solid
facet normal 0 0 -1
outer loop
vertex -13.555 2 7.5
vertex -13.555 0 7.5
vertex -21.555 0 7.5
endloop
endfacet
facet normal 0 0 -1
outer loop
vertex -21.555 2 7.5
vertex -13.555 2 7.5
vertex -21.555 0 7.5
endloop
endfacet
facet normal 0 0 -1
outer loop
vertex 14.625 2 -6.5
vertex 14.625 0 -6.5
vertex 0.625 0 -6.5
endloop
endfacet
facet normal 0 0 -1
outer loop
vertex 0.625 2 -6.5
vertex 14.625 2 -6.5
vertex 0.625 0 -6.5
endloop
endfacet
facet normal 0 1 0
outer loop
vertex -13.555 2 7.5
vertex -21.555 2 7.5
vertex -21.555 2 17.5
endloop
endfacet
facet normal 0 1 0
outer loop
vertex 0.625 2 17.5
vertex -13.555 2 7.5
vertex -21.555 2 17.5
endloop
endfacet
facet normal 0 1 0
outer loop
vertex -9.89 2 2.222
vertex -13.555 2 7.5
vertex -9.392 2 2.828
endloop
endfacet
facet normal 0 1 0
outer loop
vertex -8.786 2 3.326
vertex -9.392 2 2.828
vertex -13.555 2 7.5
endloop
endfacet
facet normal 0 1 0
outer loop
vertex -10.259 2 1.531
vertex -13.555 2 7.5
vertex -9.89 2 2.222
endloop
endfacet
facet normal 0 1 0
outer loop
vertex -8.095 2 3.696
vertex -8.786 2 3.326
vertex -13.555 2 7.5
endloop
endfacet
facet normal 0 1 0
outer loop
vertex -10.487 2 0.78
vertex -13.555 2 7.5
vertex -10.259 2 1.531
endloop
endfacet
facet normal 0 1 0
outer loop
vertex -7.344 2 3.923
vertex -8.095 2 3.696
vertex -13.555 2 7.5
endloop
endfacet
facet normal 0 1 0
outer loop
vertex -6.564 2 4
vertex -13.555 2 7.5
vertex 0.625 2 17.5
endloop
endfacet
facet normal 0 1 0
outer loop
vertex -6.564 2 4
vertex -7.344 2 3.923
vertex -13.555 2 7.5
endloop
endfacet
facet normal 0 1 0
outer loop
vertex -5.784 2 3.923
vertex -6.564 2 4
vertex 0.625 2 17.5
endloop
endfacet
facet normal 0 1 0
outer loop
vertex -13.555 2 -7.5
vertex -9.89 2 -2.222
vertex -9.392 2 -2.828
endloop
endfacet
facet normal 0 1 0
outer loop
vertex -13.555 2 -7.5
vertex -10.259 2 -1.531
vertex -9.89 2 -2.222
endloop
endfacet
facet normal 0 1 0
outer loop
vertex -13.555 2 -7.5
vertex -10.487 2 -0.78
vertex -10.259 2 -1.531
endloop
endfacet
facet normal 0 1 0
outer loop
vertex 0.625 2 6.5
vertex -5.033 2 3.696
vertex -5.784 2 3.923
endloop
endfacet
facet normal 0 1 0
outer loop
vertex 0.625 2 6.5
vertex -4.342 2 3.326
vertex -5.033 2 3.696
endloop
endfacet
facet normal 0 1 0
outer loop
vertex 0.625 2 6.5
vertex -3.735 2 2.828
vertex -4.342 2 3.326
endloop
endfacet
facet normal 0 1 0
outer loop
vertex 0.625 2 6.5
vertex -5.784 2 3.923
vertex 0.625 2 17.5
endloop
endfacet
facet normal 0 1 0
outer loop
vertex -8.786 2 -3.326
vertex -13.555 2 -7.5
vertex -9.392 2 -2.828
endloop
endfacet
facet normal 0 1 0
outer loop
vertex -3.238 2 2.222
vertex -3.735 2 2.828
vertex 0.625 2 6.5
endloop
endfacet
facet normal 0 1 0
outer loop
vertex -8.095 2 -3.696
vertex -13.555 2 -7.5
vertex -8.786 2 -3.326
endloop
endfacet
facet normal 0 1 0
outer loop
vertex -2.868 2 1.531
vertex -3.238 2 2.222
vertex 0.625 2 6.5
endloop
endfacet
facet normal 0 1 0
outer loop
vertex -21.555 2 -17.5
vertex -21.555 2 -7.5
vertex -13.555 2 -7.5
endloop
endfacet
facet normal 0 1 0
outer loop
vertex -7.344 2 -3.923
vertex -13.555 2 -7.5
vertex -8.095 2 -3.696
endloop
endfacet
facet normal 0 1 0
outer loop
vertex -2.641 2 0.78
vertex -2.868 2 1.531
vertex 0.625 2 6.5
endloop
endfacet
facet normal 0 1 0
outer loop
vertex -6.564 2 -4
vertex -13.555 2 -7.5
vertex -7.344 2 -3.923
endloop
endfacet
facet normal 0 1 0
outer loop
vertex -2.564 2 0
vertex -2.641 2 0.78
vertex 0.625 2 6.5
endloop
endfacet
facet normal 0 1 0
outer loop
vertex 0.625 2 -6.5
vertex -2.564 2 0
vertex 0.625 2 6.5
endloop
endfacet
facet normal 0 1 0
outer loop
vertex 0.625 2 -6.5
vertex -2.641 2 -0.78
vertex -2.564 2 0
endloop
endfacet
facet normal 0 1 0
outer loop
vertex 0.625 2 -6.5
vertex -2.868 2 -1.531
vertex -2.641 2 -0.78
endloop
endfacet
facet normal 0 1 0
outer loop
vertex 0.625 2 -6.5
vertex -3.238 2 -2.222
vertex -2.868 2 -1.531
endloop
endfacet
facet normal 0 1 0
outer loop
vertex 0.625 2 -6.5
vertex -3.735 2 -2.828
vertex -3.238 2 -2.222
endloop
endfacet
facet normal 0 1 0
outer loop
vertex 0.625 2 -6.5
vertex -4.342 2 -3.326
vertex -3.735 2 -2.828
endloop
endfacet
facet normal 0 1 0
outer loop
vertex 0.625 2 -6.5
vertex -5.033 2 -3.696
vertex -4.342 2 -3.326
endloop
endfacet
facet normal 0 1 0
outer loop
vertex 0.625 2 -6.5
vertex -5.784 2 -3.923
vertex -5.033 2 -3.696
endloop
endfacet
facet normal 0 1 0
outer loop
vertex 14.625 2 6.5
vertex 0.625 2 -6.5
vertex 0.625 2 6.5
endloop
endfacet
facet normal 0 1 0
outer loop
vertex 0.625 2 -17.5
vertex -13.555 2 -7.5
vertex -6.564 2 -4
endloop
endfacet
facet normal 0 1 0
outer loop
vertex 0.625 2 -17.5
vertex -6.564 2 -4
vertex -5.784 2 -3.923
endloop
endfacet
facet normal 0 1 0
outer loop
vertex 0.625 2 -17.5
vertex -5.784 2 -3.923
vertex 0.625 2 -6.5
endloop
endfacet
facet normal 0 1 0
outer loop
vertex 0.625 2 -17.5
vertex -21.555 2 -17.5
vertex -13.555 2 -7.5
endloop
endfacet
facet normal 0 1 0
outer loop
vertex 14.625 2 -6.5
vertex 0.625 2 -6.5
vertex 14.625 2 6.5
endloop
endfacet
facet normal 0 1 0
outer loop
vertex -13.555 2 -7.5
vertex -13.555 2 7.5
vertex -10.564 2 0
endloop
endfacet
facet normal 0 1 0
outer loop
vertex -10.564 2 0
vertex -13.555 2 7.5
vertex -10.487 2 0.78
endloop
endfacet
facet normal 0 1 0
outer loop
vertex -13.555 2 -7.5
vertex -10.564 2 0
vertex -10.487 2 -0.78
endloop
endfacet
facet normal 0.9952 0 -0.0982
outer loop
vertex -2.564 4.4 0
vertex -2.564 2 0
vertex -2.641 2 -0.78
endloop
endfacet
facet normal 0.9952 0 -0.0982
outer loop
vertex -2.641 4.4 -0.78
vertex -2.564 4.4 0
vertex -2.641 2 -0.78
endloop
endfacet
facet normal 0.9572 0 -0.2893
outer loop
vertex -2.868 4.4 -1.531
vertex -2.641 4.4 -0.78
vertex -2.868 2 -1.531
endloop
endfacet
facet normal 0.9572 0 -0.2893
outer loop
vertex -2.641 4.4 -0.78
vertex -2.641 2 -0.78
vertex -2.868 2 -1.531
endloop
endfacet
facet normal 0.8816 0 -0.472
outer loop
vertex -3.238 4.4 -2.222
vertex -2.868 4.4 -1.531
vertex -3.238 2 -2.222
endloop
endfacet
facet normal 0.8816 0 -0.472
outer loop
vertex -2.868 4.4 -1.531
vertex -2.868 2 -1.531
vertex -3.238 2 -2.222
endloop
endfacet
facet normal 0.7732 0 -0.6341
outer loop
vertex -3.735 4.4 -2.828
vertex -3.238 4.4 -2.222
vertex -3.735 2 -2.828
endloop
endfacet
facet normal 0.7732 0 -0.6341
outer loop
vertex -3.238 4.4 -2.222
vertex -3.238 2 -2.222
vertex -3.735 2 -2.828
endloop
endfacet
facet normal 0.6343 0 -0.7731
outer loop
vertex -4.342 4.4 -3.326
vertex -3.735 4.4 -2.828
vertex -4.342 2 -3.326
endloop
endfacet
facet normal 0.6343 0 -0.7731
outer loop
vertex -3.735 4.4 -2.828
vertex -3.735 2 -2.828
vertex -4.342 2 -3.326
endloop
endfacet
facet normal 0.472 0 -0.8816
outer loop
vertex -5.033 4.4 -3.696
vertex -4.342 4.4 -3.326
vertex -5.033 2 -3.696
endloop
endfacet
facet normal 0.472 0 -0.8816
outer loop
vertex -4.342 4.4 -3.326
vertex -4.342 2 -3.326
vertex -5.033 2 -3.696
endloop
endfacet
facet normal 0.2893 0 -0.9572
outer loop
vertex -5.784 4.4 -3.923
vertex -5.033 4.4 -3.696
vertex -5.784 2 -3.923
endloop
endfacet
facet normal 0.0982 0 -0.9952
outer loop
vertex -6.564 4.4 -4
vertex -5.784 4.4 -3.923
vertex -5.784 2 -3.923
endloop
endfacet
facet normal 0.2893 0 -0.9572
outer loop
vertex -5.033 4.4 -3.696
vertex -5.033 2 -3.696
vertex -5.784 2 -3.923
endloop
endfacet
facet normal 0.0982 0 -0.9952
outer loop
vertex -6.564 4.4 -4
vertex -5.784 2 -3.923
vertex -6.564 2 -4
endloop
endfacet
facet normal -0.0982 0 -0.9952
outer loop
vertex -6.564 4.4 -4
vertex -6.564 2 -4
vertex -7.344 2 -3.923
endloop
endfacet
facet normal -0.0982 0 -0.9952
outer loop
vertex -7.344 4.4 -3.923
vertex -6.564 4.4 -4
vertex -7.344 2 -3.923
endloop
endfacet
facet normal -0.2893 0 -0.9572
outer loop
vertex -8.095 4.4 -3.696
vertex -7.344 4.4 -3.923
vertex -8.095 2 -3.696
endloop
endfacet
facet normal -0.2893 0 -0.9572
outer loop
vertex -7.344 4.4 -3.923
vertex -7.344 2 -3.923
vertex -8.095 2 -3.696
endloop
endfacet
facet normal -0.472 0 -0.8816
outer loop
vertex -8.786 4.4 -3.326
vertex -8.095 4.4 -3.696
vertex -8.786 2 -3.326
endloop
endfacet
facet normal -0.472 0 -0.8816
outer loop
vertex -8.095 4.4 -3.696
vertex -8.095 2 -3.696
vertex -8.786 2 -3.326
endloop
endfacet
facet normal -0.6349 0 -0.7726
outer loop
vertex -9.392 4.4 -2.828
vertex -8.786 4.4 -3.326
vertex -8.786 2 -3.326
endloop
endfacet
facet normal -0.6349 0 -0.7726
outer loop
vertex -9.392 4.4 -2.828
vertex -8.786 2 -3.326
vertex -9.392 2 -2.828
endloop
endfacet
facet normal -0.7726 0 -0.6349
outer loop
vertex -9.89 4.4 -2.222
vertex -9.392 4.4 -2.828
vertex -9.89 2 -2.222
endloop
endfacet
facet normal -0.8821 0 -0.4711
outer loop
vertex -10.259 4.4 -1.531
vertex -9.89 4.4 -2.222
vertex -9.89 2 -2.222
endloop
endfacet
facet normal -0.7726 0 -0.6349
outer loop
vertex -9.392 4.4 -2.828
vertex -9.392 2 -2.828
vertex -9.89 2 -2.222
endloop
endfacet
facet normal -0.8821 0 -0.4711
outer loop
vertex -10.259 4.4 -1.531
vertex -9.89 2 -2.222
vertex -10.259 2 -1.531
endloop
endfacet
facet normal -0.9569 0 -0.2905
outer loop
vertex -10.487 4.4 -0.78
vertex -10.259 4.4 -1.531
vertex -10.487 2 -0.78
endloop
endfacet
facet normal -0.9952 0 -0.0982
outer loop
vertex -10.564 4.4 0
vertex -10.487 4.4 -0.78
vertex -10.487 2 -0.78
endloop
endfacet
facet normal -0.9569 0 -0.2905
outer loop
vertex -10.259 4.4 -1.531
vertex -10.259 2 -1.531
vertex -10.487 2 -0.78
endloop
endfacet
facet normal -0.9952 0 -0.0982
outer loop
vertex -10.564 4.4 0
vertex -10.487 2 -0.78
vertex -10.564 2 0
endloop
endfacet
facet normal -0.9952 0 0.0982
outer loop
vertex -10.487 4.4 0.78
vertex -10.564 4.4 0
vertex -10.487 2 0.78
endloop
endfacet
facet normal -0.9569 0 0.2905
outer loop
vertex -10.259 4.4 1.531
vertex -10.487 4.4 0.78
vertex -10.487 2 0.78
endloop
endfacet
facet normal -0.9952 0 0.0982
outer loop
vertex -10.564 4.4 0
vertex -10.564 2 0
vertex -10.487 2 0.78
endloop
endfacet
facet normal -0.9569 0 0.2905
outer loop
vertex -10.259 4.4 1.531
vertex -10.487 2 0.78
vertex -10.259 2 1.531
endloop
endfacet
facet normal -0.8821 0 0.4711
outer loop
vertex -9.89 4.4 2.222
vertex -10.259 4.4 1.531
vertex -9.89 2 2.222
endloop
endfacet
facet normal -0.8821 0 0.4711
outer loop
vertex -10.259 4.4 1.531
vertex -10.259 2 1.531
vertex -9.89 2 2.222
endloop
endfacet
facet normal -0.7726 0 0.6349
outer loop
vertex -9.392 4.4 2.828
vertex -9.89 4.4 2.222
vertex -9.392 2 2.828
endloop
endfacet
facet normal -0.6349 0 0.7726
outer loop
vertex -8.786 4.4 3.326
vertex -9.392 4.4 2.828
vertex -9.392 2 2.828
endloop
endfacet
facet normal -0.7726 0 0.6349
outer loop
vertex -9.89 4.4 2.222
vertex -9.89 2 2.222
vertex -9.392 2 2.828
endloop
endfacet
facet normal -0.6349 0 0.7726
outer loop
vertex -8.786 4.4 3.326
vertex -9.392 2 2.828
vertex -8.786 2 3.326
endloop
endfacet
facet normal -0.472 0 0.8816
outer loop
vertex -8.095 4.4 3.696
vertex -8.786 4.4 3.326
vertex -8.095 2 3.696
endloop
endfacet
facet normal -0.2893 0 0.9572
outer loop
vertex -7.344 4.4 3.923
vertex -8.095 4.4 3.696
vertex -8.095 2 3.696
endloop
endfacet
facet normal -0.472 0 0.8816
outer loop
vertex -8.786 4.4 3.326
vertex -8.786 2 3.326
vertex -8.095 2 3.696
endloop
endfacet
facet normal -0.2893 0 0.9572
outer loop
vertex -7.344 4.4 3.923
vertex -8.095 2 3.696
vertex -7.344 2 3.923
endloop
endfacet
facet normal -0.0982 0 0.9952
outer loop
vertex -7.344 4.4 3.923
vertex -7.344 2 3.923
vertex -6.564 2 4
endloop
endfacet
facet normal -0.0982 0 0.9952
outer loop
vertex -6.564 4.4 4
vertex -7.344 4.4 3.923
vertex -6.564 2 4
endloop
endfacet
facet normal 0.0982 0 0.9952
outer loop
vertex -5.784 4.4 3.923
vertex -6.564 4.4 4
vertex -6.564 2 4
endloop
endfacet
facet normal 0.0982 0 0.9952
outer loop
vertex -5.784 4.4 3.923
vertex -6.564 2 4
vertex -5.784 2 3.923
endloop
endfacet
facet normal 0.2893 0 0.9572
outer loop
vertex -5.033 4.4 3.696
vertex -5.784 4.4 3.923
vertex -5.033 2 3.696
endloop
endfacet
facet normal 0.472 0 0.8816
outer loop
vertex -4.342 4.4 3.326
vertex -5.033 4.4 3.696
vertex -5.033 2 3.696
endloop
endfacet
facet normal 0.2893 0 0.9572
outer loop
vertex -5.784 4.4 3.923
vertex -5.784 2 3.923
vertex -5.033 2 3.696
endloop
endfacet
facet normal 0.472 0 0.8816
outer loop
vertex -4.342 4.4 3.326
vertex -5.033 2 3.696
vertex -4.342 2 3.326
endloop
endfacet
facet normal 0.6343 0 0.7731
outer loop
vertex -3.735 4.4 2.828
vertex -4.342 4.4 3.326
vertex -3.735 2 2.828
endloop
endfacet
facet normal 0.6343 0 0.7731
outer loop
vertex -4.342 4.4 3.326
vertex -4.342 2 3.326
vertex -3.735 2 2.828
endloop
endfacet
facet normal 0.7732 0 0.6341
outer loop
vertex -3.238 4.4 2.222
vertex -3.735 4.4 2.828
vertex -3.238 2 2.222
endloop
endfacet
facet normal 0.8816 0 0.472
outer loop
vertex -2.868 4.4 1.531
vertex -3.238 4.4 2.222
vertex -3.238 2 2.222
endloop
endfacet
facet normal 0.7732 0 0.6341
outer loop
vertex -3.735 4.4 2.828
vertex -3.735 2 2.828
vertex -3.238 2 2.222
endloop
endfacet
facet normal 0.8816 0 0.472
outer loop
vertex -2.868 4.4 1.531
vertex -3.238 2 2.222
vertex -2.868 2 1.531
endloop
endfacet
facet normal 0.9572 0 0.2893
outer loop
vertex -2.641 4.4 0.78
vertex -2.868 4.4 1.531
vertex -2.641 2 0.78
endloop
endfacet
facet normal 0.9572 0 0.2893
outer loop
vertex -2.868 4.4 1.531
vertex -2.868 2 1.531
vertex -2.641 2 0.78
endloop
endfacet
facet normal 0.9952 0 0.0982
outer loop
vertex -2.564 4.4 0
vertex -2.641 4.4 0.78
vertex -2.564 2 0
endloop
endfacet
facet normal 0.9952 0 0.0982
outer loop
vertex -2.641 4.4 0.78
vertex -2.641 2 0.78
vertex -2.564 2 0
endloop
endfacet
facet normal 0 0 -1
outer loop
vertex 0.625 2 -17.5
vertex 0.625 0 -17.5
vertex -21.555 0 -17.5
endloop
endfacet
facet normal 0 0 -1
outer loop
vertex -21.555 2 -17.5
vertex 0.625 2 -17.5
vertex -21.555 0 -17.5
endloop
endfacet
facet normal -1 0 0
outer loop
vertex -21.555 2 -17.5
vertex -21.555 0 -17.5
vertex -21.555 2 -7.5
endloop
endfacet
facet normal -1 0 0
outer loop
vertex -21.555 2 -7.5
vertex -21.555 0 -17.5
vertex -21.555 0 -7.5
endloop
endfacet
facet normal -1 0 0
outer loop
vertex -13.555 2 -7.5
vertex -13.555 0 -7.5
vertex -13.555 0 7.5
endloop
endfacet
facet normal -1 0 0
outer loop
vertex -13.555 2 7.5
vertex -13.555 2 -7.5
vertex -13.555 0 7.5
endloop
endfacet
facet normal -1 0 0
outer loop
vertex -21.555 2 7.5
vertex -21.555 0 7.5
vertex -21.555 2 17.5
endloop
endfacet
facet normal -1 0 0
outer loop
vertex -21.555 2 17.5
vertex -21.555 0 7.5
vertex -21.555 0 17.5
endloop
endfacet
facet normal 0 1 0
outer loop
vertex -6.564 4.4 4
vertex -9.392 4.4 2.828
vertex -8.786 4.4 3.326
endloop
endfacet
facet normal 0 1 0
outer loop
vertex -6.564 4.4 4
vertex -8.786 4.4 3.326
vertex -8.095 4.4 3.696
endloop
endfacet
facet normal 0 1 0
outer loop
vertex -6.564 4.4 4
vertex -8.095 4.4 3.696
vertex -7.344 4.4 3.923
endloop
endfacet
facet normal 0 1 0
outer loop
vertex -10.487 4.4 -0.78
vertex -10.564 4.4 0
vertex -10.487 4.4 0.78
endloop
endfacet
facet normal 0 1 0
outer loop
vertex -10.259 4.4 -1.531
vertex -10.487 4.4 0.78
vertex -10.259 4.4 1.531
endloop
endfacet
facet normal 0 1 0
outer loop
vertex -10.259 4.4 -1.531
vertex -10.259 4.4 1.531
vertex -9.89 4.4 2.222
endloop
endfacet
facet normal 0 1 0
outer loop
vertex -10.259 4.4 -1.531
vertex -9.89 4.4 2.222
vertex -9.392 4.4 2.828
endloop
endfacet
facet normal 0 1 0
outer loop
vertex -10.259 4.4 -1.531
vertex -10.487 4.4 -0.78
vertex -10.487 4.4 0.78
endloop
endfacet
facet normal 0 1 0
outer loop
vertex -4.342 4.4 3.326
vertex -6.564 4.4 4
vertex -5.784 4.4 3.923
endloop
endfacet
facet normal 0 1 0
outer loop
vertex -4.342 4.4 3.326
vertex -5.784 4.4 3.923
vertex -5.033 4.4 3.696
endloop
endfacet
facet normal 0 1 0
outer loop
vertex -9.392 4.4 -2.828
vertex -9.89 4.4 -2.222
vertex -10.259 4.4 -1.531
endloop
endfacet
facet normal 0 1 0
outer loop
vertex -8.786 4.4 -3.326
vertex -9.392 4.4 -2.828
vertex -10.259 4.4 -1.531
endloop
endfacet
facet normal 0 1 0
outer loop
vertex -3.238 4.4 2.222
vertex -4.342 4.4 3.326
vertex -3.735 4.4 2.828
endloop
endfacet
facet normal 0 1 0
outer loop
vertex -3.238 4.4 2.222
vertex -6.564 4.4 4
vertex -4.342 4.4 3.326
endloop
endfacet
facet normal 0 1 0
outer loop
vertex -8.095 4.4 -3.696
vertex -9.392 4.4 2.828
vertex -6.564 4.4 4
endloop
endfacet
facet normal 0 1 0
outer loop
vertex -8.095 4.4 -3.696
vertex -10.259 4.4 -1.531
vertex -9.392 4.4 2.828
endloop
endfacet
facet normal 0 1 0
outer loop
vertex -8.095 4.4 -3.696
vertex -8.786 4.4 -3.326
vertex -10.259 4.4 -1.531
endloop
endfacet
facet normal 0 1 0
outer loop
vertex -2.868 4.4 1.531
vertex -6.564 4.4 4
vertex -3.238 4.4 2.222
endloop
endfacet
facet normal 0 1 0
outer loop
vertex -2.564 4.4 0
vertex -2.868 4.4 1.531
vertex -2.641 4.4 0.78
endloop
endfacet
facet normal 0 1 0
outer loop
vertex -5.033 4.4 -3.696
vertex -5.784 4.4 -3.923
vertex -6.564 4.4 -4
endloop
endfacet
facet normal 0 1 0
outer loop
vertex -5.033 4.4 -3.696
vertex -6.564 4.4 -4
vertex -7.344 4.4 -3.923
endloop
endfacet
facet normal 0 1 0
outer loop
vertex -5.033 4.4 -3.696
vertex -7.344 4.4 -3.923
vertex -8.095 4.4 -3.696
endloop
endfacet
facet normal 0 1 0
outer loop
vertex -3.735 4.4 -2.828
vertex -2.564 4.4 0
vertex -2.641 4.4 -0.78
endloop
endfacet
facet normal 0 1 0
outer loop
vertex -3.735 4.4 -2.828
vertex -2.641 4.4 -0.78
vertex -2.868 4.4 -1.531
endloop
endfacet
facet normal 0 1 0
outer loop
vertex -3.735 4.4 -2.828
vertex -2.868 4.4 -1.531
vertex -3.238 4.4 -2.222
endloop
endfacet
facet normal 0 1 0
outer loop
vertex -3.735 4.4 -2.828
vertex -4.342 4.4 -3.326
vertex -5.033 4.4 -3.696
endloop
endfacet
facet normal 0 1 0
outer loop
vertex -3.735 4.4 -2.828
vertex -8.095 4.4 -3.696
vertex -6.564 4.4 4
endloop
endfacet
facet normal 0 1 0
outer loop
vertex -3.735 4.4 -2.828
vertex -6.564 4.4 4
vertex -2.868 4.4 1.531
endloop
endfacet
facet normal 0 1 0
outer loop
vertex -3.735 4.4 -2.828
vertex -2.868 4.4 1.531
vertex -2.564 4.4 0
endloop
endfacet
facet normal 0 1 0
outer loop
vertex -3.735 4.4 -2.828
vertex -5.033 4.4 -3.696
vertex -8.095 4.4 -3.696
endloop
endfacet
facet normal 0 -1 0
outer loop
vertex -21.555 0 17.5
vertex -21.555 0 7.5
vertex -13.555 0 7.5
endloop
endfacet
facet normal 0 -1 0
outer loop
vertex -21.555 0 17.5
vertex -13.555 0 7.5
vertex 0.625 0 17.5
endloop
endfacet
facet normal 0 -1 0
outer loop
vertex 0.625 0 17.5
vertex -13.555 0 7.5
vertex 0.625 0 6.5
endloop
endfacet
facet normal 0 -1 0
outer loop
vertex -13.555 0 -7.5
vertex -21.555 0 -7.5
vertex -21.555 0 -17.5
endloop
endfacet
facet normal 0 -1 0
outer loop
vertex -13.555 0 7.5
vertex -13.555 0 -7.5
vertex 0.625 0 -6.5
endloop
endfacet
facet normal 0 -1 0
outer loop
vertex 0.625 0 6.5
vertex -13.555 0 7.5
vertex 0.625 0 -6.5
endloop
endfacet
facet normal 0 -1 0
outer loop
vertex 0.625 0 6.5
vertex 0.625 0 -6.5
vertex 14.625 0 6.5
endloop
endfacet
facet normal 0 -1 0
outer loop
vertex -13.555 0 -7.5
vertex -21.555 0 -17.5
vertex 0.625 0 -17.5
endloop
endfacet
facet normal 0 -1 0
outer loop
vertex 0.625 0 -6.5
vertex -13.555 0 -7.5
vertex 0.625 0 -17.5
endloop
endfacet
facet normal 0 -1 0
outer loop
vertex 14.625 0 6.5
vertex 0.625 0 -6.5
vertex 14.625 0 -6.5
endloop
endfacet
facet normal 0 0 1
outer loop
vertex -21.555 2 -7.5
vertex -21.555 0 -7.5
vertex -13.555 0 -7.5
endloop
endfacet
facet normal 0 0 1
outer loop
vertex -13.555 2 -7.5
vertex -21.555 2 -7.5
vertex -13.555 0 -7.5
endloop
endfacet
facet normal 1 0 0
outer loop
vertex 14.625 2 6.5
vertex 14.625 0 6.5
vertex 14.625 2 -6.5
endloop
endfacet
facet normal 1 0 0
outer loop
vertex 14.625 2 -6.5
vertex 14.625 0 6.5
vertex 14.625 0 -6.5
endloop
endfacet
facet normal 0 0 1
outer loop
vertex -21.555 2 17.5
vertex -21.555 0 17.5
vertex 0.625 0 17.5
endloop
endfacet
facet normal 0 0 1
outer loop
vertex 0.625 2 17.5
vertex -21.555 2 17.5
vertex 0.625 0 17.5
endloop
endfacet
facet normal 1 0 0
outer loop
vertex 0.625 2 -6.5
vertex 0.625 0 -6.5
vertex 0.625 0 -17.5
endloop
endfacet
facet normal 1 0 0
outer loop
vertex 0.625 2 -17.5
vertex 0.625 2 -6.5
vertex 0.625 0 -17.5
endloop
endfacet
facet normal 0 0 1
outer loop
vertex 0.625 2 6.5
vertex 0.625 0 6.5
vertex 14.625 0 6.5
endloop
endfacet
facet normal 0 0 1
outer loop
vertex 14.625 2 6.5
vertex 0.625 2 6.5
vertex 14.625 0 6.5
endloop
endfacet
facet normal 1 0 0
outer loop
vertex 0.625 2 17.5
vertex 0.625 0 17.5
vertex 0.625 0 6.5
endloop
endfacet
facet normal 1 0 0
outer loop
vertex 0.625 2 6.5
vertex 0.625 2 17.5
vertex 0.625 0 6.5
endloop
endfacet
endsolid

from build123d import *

# Parameters (mm, degrees)
BOSS_EXTRUDE1_DEPTH = 2
SKETCH2_R           = 4
BOSS_EXTRUDE2_DEPTH = 2.4


with BuildPart() as part:
    # Sketch1 → Boss-Extrude1 (new body)
    with BuildSketch(Plane(origin=(0, 0, 0), x_dir=(1, 0, 0), z_dir=(0, 1, 0))):
        Polygon((0.624790047, 6.5), (0.624790047, 17.5), (-9.416796267, 17.5), (-21.555209953, 17.5), (-21.555209953, 7.5), (-13.555209953, 7.5), (-13.555209953, -7.5), (-21.555209953, -7.5), (-21.555209953, -17.5), (-9.416796267, -17.5), (0.624790047, -17.5), (0.624790047, -6.5), (14.624790047, -6.5), (14.624790047, 6.5), align=None)
    extrude(amount=BOSS_EXTRUDE1_DEPTH)

    # Sketch2 → Boss-Extrude2 (add)
    with BuildSketch(Plane(origin=(0, 2, 0), x_dir=(1, 0, 0), z_dir=(0, 1, 0))):
        with Locations((-6.563909953, 0)):
            Circle(SKETCH2_R)
    extrude(amount=BOSS_EXTRUDE2_DEPTH)


solid = part.part
